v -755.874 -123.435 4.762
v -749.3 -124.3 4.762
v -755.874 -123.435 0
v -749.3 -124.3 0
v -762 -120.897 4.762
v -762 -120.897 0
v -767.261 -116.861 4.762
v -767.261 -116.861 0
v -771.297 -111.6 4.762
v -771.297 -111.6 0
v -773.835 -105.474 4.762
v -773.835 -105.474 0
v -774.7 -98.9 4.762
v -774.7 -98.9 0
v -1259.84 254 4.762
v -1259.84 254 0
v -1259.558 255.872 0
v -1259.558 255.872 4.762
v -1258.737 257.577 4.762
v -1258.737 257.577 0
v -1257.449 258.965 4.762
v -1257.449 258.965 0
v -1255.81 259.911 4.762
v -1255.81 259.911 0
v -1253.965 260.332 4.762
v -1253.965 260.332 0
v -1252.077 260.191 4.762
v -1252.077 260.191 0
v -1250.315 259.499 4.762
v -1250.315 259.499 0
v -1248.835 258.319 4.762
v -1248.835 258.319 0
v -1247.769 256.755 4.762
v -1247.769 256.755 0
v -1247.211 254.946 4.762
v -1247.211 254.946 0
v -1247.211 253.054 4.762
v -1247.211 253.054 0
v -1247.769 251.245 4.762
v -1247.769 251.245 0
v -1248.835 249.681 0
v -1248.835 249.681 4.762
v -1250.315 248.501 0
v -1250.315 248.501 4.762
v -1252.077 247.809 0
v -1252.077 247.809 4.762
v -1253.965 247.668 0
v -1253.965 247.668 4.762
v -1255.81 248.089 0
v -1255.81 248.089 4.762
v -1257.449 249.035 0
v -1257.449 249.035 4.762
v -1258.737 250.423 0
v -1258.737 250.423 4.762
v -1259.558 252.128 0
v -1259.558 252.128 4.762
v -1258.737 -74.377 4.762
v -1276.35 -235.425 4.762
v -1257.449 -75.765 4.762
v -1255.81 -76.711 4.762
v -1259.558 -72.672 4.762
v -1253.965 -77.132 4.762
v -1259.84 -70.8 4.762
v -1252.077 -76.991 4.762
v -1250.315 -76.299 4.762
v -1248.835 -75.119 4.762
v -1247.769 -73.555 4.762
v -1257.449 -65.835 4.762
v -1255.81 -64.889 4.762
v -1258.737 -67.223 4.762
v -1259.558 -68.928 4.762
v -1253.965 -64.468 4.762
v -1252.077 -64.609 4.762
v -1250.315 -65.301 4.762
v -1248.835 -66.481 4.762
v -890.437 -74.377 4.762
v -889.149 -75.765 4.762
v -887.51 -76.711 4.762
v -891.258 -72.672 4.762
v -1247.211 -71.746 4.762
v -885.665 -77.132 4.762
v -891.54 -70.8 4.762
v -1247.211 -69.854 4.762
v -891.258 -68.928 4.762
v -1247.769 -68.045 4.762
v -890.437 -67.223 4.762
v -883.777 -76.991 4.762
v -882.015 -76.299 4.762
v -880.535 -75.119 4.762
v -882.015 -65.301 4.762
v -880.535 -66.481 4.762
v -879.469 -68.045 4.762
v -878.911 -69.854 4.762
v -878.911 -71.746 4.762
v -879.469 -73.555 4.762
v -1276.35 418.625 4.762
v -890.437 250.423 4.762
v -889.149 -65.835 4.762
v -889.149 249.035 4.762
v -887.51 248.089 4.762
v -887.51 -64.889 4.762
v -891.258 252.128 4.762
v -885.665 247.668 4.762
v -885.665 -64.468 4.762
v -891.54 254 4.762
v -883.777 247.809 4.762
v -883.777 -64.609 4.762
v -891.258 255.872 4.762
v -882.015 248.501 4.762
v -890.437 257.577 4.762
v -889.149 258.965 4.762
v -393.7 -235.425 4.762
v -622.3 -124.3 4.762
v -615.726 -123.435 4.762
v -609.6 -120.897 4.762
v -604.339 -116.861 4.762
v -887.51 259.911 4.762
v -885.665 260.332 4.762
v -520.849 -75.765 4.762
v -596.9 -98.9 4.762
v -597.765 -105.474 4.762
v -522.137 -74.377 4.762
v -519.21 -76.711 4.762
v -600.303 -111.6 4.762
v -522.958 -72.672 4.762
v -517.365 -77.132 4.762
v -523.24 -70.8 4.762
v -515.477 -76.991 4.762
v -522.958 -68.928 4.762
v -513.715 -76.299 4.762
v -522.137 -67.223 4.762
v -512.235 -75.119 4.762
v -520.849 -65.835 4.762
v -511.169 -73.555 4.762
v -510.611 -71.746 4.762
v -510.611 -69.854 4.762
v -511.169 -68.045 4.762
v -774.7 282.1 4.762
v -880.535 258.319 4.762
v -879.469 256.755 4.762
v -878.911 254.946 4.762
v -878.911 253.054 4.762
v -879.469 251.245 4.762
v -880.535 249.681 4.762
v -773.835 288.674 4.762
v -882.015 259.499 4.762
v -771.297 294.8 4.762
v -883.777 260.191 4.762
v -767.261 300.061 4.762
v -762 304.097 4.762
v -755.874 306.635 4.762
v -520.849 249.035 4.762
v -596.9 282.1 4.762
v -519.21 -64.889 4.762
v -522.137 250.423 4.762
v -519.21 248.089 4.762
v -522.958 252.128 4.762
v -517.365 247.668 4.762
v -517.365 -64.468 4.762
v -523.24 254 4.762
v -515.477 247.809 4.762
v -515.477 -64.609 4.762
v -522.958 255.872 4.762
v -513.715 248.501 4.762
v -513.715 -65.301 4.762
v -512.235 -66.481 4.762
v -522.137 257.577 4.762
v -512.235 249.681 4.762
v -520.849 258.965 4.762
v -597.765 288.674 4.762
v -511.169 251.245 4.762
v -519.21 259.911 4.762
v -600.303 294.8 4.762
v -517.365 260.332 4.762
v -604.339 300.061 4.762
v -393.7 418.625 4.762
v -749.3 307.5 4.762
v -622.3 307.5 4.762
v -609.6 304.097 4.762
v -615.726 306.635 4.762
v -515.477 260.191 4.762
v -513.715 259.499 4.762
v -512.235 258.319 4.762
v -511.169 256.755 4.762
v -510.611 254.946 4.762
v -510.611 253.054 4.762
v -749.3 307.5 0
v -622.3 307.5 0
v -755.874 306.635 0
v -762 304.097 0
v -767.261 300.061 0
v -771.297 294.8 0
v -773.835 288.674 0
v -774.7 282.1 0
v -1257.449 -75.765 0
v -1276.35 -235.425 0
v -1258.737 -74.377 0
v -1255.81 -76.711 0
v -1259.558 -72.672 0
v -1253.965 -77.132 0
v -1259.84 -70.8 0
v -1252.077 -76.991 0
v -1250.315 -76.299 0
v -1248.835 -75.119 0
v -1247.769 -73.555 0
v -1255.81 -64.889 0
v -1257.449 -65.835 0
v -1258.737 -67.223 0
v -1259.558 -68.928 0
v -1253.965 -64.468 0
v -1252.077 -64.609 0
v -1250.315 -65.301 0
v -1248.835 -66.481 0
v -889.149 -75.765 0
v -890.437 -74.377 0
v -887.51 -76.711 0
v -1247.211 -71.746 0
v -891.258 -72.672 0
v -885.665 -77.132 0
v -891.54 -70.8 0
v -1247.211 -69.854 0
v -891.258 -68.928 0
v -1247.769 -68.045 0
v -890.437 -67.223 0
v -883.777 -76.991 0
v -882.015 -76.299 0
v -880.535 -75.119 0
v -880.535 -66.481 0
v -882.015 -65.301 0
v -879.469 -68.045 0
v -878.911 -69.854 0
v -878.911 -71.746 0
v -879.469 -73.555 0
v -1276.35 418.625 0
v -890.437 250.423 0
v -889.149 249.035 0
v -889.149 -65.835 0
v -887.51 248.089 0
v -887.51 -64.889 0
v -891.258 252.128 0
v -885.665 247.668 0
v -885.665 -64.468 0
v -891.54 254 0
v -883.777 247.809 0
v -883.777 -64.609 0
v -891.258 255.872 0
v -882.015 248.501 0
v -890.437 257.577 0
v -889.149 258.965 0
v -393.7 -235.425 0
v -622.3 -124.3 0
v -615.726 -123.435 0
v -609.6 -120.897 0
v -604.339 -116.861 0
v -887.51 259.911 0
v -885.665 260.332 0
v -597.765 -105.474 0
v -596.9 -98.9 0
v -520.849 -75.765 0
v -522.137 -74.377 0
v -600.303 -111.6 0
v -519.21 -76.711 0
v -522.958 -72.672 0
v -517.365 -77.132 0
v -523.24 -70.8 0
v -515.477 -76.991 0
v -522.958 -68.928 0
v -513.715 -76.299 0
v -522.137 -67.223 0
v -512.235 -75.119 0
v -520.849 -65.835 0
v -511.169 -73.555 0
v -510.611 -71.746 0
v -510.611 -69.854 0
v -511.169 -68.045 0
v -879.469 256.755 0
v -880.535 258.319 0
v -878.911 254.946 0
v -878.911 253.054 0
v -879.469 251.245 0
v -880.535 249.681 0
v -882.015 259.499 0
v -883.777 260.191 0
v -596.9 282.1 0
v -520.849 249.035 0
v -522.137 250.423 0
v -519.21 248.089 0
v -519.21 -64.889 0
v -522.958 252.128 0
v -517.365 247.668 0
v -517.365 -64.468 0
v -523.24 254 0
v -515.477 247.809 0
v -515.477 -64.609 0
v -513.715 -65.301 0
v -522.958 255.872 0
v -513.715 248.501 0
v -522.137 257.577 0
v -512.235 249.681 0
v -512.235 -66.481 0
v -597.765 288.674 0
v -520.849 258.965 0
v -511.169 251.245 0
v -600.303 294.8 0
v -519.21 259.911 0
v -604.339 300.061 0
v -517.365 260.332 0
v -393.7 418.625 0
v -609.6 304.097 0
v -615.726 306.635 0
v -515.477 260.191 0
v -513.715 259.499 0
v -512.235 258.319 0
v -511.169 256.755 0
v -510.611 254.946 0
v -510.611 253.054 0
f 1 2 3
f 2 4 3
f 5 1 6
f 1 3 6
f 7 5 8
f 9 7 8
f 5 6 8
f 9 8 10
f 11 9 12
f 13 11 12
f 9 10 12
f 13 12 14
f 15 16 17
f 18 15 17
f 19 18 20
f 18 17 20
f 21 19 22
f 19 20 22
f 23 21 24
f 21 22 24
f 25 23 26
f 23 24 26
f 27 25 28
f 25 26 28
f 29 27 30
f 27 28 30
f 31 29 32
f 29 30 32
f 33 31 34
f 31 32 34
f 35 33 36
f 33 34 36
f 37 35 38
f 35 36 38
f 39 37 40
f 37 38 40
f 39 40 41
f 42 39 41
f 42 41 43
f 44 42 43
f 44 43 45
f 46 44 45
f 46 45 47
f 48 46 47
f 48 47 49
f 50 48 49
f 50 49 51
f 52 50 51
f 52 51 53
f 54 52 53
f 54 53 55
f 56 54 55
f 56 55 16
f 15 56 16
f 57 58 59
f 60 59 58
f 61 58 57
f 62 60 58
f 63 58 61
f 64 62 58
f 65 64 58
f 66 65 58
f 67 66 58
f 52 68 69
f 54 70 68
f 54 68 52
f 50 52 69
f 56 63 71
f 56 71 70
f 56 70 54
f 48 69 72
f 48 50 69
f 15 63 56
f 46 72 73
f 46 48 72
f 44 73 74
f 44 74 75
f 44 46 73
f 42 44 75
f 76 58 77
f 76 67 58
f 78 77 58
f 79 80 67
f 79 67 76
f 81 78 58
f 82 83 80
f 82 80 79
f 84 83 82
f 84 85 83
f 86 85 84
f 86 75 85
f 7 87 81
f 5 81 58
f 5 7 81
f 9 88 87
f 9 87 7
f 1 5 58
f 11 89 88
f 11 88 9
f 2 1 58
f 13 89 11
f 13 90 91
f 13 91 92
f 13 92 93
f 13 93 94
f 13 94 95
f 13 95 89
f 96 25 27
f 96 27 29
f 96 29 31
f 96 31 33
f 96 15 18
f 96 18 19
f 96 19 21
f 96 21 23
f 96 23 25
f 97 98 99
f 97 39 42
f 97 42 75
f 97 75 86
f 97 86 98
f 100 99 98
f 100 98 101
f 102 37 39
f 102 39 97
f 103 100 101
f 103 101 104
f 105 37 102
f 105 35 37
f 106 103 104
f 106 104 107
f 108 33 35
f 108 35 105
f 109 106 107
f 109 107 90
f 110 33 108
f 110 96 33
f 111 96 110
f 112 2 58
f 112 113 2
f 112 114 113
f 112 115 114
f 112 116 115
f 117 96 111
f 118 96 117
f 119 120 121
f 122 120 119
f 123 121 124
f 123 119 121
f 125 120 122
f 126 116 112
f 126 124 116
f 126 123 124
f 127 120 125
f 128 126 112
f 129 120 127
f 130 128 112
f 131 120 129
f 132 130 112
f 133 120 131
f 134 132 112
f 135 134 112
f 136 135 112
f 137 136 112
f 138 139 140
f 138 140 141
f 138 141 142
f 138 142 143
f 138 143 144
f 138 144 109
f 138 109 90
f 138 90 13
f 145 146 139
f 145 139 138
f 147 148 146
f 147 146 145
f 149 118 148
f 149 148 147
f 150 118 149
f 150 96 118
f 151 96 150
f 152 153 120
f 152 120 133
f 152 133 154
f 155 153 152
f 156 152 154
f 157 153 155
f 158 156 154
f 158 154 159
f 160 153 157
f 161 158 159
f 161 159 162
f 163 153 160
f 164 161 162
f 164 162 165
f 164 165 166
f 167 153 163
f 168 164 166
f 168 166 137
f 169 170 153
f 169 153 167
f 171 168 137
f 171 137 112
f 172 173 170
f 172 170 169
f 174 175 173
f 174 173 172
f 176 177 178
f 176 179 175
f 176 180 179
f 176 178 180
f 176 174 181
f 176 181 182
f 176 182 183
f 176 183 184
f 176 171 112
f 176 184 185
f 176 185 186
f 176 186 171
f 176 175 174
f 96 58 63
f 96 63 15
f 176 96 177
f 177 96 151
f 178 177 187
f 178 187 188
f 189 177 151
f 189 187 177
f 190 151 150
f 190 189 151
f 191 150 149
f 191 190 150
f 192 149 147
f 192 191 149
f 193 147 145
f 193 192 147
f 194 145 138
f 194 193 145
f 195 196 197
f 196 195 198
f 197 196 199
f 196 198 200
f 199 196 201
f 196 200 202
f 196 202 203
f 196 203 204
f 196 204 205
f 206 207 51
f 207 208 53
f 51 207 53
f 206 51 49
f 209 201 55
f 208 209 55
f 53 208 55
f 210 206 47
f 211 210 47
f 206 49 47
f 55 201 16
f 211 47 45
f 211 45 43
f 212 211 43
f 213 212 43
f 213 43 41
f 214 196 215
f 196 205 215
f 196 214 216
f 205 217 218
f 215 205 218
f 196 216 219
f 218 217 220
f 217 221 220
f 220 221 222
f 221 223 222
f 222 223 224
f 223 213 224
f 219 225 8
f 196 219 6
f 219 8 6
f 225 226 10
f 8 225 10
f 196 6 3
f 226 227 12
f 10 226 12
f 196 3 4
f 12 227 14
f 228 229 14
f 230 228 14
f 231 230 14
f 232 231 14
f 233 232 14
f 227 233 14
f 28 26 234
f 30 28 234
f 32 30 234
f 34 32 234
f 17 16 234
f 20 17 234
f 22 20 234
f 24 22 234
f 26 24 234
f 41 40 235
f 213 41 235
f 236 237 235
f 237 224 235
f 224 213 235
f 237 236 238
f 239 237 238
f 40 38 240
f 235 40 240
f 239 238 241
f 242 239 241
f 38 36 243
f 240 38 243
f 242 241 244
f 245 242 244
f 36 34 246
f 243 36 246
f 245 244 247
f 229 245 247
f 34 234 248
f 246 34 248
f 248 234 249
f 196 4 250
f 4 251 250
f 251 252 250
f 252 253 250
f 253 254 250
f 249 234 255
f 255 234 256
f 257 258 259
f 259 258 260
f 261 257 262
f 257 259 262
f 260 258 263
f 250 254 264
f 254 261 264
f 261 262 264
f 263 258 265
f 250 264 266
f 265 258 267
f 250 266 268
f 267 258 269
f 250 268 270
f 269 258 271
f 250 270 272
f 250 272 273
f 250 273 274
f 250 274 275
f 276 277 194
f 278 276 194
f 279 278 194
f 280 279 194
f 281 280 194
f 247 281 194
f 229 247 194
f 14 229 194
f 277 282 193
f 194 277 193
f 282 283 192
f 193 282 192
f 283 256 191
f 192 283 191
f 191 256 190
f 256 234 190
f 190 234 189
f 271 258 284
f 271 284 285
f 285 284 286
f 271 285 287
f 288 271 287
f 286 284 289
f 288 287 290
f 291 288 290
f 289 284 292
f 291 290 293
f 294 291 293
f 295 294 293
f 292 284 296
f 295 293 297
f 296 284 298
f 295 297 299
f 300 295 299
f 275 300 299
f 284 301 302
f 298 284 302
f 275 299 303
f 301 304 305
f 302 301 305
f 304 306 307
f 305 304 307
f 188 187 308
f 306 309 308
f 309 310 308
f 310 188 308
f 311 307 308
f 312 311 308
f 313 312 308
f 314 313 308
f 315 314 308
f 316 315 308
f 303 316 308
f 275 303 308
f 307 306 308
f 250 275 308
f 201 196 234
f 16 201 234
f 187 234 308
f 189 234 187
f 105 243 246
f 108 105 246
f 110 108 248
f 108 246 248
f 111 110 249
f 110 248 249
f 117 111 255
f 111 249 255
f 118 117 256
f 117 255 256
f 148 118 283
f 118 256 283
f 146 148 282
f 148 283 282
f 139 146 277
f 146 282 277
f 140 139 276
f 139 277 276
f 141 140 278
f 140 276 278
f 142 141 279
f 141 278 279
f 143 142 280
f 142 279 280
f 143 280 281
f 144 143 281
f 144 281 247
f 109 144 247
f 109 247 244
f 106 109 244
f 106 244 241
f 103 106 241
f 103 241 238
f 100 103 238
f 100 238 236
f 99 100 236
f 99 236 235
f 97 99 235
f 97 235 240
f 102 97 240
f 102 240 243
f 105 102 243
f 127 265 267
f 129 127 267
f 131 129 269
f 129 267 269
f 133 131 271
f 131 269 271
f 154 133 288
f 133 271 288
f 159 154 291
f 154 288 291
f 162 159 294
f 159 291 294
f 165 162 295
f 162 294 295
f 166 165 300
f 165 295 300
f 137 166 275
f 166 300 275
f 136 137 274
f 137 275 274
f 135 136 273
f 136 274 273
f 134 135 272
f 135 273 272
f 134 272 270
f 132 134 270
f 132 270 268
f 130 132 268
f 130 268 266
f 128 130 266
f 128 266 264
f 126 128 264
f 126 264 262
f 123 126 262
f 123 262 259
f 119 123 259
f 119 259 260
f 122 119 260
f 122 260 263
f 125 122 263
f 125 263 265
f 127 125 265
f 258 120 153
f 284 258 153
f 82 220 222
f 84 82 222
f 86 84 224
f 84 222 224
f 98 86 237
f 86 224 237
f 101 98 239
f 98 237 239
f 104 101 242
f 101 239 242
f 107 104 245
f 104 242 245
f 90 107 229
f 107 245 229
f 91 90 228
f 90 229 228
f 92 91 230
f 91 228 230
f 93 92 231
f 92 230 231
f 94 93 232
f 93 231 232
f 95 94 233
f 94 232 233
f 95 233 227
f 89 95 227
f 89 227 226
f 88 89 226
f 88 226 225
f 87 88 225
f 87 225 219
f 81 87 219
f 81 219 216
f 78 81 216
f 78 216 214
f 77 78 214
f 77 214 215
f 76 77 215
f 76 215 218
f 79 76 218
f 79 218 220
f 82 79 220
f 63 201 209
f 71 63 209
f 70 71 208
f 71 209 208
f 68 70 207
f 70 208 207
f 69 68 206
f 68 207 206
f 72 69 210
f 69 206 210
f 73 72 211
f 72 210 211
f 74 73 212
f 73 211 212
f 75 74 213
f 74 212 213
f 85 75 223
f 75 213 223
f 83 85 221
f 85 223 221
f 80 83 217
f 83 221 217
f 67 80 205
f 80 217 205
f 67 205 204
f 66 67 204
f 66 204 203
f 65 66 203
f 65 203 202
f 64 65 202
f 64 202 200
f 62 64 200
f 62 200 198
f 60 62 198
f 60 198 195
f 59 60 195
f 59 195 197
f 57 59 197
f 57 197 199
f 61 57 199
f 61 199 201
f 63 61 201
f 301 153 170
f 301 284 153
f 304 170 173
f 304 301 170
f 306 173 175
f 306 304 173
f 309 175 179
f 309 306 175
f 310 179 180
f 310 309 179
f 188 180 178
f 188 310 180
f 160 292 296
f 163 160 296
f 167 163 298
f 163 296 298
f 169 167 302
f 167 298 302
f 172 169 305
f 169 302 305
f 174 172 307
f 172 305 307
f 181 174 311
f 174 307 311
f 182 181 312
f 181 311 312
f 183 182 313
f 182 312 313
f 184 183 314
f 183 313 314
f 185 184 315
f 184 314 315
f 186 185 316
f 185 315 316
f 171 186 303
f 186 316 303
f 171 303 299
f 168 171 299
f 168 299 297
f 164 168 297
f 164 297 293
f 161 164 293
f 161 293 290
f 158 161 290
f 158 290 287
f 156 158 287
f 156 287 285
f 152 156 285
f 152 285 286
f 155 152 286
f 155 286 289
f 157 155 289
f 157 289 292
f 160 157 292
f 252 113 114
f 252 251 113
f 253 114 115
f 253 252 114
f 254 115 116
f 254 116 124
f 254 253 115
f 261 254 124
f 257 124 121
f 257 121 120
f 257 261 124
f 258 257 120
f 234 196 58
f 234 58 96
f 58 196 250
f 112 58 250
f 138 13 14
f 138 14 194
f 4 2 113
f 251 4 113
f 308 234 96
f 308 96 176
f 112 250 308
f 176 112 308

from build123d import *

# Parameters (mm, degrees)
SKETCH1_W          = 882.65
SKETCH1_H          = 654.05
EXTRUDE1_DEPTH     = 4.7625
SKETCH2_R          = 6.35
CUT_EXTRUDE1_DEPTH = 5.7625
SKETCH3_W          = 177.8
SKETCH3_H          = 431.8
CUT_EXTRUDE2_DEPTH = 5.7625
FILLET1_R          = 25.4


with BuildPart() as part:
    # Sketch1 → Extrude1 (new body)
    with BuildSketch(Plane.XY):
        with Locations((-835.025, 91.6)):
            Rectangle(SKETCH1_W, SKETCH1_H)
    extrude(amount=EXTRUDE1_DEPTH)

    # Sketch2 → Cut-Extrude1 (cut, through all)
    with BuildSketch(Plane(origin=(0, 0, 0), x_dir=(-1, 0, 0), z_dir=(0, 0, -1))):
        with Locations((516.89, 254)):
            Circle(SKETCH2_R)
        with Locations((516.89, -70.8)):
            Circle(SKETCH2_R)
        with Locations((885.19, 254)):
            Circle(SKETCH2_R)
        with Locations((885.19, -70.8)):
            Circle(SKETCH2_R)
        with Locations((1253.49, -70.8)):
            Circle(SKETCH2_R)
        with Locations((1253.49, 254)):
            Circle(SKETCH2_R)
    extrude(amount=-CUT_EXTRUDE1_DEPTH, mode=Mode.SUBTRACT)

    # Sketch3 → Cut-Extrude2 (cut, through all)
    with BuildSketch(Plane.XY.offset(4.7625)):
        with Locations((-685.8, 91.6)):
            Rectangle(SKETCH3_W, SKETCH3_H)
    extrude(amount=-CUT_EXTRUDE2_DEPTH, mode=Mode.SUBTRACT)

    # Fillet1
    fillet1_edges = [part.edges().sort_by_distance(p)[0] for p in [
        (-596.9, 307.5, 2.38125),
        (-596.9, -124.3, 2.38125),
        (-774.7, -124.3, 2.38125),
        (-774.7, 307.5, 2.38125),
    ]]
    fillet(fillet1_edges, radius=FILLET1_R)


solid = part.part
